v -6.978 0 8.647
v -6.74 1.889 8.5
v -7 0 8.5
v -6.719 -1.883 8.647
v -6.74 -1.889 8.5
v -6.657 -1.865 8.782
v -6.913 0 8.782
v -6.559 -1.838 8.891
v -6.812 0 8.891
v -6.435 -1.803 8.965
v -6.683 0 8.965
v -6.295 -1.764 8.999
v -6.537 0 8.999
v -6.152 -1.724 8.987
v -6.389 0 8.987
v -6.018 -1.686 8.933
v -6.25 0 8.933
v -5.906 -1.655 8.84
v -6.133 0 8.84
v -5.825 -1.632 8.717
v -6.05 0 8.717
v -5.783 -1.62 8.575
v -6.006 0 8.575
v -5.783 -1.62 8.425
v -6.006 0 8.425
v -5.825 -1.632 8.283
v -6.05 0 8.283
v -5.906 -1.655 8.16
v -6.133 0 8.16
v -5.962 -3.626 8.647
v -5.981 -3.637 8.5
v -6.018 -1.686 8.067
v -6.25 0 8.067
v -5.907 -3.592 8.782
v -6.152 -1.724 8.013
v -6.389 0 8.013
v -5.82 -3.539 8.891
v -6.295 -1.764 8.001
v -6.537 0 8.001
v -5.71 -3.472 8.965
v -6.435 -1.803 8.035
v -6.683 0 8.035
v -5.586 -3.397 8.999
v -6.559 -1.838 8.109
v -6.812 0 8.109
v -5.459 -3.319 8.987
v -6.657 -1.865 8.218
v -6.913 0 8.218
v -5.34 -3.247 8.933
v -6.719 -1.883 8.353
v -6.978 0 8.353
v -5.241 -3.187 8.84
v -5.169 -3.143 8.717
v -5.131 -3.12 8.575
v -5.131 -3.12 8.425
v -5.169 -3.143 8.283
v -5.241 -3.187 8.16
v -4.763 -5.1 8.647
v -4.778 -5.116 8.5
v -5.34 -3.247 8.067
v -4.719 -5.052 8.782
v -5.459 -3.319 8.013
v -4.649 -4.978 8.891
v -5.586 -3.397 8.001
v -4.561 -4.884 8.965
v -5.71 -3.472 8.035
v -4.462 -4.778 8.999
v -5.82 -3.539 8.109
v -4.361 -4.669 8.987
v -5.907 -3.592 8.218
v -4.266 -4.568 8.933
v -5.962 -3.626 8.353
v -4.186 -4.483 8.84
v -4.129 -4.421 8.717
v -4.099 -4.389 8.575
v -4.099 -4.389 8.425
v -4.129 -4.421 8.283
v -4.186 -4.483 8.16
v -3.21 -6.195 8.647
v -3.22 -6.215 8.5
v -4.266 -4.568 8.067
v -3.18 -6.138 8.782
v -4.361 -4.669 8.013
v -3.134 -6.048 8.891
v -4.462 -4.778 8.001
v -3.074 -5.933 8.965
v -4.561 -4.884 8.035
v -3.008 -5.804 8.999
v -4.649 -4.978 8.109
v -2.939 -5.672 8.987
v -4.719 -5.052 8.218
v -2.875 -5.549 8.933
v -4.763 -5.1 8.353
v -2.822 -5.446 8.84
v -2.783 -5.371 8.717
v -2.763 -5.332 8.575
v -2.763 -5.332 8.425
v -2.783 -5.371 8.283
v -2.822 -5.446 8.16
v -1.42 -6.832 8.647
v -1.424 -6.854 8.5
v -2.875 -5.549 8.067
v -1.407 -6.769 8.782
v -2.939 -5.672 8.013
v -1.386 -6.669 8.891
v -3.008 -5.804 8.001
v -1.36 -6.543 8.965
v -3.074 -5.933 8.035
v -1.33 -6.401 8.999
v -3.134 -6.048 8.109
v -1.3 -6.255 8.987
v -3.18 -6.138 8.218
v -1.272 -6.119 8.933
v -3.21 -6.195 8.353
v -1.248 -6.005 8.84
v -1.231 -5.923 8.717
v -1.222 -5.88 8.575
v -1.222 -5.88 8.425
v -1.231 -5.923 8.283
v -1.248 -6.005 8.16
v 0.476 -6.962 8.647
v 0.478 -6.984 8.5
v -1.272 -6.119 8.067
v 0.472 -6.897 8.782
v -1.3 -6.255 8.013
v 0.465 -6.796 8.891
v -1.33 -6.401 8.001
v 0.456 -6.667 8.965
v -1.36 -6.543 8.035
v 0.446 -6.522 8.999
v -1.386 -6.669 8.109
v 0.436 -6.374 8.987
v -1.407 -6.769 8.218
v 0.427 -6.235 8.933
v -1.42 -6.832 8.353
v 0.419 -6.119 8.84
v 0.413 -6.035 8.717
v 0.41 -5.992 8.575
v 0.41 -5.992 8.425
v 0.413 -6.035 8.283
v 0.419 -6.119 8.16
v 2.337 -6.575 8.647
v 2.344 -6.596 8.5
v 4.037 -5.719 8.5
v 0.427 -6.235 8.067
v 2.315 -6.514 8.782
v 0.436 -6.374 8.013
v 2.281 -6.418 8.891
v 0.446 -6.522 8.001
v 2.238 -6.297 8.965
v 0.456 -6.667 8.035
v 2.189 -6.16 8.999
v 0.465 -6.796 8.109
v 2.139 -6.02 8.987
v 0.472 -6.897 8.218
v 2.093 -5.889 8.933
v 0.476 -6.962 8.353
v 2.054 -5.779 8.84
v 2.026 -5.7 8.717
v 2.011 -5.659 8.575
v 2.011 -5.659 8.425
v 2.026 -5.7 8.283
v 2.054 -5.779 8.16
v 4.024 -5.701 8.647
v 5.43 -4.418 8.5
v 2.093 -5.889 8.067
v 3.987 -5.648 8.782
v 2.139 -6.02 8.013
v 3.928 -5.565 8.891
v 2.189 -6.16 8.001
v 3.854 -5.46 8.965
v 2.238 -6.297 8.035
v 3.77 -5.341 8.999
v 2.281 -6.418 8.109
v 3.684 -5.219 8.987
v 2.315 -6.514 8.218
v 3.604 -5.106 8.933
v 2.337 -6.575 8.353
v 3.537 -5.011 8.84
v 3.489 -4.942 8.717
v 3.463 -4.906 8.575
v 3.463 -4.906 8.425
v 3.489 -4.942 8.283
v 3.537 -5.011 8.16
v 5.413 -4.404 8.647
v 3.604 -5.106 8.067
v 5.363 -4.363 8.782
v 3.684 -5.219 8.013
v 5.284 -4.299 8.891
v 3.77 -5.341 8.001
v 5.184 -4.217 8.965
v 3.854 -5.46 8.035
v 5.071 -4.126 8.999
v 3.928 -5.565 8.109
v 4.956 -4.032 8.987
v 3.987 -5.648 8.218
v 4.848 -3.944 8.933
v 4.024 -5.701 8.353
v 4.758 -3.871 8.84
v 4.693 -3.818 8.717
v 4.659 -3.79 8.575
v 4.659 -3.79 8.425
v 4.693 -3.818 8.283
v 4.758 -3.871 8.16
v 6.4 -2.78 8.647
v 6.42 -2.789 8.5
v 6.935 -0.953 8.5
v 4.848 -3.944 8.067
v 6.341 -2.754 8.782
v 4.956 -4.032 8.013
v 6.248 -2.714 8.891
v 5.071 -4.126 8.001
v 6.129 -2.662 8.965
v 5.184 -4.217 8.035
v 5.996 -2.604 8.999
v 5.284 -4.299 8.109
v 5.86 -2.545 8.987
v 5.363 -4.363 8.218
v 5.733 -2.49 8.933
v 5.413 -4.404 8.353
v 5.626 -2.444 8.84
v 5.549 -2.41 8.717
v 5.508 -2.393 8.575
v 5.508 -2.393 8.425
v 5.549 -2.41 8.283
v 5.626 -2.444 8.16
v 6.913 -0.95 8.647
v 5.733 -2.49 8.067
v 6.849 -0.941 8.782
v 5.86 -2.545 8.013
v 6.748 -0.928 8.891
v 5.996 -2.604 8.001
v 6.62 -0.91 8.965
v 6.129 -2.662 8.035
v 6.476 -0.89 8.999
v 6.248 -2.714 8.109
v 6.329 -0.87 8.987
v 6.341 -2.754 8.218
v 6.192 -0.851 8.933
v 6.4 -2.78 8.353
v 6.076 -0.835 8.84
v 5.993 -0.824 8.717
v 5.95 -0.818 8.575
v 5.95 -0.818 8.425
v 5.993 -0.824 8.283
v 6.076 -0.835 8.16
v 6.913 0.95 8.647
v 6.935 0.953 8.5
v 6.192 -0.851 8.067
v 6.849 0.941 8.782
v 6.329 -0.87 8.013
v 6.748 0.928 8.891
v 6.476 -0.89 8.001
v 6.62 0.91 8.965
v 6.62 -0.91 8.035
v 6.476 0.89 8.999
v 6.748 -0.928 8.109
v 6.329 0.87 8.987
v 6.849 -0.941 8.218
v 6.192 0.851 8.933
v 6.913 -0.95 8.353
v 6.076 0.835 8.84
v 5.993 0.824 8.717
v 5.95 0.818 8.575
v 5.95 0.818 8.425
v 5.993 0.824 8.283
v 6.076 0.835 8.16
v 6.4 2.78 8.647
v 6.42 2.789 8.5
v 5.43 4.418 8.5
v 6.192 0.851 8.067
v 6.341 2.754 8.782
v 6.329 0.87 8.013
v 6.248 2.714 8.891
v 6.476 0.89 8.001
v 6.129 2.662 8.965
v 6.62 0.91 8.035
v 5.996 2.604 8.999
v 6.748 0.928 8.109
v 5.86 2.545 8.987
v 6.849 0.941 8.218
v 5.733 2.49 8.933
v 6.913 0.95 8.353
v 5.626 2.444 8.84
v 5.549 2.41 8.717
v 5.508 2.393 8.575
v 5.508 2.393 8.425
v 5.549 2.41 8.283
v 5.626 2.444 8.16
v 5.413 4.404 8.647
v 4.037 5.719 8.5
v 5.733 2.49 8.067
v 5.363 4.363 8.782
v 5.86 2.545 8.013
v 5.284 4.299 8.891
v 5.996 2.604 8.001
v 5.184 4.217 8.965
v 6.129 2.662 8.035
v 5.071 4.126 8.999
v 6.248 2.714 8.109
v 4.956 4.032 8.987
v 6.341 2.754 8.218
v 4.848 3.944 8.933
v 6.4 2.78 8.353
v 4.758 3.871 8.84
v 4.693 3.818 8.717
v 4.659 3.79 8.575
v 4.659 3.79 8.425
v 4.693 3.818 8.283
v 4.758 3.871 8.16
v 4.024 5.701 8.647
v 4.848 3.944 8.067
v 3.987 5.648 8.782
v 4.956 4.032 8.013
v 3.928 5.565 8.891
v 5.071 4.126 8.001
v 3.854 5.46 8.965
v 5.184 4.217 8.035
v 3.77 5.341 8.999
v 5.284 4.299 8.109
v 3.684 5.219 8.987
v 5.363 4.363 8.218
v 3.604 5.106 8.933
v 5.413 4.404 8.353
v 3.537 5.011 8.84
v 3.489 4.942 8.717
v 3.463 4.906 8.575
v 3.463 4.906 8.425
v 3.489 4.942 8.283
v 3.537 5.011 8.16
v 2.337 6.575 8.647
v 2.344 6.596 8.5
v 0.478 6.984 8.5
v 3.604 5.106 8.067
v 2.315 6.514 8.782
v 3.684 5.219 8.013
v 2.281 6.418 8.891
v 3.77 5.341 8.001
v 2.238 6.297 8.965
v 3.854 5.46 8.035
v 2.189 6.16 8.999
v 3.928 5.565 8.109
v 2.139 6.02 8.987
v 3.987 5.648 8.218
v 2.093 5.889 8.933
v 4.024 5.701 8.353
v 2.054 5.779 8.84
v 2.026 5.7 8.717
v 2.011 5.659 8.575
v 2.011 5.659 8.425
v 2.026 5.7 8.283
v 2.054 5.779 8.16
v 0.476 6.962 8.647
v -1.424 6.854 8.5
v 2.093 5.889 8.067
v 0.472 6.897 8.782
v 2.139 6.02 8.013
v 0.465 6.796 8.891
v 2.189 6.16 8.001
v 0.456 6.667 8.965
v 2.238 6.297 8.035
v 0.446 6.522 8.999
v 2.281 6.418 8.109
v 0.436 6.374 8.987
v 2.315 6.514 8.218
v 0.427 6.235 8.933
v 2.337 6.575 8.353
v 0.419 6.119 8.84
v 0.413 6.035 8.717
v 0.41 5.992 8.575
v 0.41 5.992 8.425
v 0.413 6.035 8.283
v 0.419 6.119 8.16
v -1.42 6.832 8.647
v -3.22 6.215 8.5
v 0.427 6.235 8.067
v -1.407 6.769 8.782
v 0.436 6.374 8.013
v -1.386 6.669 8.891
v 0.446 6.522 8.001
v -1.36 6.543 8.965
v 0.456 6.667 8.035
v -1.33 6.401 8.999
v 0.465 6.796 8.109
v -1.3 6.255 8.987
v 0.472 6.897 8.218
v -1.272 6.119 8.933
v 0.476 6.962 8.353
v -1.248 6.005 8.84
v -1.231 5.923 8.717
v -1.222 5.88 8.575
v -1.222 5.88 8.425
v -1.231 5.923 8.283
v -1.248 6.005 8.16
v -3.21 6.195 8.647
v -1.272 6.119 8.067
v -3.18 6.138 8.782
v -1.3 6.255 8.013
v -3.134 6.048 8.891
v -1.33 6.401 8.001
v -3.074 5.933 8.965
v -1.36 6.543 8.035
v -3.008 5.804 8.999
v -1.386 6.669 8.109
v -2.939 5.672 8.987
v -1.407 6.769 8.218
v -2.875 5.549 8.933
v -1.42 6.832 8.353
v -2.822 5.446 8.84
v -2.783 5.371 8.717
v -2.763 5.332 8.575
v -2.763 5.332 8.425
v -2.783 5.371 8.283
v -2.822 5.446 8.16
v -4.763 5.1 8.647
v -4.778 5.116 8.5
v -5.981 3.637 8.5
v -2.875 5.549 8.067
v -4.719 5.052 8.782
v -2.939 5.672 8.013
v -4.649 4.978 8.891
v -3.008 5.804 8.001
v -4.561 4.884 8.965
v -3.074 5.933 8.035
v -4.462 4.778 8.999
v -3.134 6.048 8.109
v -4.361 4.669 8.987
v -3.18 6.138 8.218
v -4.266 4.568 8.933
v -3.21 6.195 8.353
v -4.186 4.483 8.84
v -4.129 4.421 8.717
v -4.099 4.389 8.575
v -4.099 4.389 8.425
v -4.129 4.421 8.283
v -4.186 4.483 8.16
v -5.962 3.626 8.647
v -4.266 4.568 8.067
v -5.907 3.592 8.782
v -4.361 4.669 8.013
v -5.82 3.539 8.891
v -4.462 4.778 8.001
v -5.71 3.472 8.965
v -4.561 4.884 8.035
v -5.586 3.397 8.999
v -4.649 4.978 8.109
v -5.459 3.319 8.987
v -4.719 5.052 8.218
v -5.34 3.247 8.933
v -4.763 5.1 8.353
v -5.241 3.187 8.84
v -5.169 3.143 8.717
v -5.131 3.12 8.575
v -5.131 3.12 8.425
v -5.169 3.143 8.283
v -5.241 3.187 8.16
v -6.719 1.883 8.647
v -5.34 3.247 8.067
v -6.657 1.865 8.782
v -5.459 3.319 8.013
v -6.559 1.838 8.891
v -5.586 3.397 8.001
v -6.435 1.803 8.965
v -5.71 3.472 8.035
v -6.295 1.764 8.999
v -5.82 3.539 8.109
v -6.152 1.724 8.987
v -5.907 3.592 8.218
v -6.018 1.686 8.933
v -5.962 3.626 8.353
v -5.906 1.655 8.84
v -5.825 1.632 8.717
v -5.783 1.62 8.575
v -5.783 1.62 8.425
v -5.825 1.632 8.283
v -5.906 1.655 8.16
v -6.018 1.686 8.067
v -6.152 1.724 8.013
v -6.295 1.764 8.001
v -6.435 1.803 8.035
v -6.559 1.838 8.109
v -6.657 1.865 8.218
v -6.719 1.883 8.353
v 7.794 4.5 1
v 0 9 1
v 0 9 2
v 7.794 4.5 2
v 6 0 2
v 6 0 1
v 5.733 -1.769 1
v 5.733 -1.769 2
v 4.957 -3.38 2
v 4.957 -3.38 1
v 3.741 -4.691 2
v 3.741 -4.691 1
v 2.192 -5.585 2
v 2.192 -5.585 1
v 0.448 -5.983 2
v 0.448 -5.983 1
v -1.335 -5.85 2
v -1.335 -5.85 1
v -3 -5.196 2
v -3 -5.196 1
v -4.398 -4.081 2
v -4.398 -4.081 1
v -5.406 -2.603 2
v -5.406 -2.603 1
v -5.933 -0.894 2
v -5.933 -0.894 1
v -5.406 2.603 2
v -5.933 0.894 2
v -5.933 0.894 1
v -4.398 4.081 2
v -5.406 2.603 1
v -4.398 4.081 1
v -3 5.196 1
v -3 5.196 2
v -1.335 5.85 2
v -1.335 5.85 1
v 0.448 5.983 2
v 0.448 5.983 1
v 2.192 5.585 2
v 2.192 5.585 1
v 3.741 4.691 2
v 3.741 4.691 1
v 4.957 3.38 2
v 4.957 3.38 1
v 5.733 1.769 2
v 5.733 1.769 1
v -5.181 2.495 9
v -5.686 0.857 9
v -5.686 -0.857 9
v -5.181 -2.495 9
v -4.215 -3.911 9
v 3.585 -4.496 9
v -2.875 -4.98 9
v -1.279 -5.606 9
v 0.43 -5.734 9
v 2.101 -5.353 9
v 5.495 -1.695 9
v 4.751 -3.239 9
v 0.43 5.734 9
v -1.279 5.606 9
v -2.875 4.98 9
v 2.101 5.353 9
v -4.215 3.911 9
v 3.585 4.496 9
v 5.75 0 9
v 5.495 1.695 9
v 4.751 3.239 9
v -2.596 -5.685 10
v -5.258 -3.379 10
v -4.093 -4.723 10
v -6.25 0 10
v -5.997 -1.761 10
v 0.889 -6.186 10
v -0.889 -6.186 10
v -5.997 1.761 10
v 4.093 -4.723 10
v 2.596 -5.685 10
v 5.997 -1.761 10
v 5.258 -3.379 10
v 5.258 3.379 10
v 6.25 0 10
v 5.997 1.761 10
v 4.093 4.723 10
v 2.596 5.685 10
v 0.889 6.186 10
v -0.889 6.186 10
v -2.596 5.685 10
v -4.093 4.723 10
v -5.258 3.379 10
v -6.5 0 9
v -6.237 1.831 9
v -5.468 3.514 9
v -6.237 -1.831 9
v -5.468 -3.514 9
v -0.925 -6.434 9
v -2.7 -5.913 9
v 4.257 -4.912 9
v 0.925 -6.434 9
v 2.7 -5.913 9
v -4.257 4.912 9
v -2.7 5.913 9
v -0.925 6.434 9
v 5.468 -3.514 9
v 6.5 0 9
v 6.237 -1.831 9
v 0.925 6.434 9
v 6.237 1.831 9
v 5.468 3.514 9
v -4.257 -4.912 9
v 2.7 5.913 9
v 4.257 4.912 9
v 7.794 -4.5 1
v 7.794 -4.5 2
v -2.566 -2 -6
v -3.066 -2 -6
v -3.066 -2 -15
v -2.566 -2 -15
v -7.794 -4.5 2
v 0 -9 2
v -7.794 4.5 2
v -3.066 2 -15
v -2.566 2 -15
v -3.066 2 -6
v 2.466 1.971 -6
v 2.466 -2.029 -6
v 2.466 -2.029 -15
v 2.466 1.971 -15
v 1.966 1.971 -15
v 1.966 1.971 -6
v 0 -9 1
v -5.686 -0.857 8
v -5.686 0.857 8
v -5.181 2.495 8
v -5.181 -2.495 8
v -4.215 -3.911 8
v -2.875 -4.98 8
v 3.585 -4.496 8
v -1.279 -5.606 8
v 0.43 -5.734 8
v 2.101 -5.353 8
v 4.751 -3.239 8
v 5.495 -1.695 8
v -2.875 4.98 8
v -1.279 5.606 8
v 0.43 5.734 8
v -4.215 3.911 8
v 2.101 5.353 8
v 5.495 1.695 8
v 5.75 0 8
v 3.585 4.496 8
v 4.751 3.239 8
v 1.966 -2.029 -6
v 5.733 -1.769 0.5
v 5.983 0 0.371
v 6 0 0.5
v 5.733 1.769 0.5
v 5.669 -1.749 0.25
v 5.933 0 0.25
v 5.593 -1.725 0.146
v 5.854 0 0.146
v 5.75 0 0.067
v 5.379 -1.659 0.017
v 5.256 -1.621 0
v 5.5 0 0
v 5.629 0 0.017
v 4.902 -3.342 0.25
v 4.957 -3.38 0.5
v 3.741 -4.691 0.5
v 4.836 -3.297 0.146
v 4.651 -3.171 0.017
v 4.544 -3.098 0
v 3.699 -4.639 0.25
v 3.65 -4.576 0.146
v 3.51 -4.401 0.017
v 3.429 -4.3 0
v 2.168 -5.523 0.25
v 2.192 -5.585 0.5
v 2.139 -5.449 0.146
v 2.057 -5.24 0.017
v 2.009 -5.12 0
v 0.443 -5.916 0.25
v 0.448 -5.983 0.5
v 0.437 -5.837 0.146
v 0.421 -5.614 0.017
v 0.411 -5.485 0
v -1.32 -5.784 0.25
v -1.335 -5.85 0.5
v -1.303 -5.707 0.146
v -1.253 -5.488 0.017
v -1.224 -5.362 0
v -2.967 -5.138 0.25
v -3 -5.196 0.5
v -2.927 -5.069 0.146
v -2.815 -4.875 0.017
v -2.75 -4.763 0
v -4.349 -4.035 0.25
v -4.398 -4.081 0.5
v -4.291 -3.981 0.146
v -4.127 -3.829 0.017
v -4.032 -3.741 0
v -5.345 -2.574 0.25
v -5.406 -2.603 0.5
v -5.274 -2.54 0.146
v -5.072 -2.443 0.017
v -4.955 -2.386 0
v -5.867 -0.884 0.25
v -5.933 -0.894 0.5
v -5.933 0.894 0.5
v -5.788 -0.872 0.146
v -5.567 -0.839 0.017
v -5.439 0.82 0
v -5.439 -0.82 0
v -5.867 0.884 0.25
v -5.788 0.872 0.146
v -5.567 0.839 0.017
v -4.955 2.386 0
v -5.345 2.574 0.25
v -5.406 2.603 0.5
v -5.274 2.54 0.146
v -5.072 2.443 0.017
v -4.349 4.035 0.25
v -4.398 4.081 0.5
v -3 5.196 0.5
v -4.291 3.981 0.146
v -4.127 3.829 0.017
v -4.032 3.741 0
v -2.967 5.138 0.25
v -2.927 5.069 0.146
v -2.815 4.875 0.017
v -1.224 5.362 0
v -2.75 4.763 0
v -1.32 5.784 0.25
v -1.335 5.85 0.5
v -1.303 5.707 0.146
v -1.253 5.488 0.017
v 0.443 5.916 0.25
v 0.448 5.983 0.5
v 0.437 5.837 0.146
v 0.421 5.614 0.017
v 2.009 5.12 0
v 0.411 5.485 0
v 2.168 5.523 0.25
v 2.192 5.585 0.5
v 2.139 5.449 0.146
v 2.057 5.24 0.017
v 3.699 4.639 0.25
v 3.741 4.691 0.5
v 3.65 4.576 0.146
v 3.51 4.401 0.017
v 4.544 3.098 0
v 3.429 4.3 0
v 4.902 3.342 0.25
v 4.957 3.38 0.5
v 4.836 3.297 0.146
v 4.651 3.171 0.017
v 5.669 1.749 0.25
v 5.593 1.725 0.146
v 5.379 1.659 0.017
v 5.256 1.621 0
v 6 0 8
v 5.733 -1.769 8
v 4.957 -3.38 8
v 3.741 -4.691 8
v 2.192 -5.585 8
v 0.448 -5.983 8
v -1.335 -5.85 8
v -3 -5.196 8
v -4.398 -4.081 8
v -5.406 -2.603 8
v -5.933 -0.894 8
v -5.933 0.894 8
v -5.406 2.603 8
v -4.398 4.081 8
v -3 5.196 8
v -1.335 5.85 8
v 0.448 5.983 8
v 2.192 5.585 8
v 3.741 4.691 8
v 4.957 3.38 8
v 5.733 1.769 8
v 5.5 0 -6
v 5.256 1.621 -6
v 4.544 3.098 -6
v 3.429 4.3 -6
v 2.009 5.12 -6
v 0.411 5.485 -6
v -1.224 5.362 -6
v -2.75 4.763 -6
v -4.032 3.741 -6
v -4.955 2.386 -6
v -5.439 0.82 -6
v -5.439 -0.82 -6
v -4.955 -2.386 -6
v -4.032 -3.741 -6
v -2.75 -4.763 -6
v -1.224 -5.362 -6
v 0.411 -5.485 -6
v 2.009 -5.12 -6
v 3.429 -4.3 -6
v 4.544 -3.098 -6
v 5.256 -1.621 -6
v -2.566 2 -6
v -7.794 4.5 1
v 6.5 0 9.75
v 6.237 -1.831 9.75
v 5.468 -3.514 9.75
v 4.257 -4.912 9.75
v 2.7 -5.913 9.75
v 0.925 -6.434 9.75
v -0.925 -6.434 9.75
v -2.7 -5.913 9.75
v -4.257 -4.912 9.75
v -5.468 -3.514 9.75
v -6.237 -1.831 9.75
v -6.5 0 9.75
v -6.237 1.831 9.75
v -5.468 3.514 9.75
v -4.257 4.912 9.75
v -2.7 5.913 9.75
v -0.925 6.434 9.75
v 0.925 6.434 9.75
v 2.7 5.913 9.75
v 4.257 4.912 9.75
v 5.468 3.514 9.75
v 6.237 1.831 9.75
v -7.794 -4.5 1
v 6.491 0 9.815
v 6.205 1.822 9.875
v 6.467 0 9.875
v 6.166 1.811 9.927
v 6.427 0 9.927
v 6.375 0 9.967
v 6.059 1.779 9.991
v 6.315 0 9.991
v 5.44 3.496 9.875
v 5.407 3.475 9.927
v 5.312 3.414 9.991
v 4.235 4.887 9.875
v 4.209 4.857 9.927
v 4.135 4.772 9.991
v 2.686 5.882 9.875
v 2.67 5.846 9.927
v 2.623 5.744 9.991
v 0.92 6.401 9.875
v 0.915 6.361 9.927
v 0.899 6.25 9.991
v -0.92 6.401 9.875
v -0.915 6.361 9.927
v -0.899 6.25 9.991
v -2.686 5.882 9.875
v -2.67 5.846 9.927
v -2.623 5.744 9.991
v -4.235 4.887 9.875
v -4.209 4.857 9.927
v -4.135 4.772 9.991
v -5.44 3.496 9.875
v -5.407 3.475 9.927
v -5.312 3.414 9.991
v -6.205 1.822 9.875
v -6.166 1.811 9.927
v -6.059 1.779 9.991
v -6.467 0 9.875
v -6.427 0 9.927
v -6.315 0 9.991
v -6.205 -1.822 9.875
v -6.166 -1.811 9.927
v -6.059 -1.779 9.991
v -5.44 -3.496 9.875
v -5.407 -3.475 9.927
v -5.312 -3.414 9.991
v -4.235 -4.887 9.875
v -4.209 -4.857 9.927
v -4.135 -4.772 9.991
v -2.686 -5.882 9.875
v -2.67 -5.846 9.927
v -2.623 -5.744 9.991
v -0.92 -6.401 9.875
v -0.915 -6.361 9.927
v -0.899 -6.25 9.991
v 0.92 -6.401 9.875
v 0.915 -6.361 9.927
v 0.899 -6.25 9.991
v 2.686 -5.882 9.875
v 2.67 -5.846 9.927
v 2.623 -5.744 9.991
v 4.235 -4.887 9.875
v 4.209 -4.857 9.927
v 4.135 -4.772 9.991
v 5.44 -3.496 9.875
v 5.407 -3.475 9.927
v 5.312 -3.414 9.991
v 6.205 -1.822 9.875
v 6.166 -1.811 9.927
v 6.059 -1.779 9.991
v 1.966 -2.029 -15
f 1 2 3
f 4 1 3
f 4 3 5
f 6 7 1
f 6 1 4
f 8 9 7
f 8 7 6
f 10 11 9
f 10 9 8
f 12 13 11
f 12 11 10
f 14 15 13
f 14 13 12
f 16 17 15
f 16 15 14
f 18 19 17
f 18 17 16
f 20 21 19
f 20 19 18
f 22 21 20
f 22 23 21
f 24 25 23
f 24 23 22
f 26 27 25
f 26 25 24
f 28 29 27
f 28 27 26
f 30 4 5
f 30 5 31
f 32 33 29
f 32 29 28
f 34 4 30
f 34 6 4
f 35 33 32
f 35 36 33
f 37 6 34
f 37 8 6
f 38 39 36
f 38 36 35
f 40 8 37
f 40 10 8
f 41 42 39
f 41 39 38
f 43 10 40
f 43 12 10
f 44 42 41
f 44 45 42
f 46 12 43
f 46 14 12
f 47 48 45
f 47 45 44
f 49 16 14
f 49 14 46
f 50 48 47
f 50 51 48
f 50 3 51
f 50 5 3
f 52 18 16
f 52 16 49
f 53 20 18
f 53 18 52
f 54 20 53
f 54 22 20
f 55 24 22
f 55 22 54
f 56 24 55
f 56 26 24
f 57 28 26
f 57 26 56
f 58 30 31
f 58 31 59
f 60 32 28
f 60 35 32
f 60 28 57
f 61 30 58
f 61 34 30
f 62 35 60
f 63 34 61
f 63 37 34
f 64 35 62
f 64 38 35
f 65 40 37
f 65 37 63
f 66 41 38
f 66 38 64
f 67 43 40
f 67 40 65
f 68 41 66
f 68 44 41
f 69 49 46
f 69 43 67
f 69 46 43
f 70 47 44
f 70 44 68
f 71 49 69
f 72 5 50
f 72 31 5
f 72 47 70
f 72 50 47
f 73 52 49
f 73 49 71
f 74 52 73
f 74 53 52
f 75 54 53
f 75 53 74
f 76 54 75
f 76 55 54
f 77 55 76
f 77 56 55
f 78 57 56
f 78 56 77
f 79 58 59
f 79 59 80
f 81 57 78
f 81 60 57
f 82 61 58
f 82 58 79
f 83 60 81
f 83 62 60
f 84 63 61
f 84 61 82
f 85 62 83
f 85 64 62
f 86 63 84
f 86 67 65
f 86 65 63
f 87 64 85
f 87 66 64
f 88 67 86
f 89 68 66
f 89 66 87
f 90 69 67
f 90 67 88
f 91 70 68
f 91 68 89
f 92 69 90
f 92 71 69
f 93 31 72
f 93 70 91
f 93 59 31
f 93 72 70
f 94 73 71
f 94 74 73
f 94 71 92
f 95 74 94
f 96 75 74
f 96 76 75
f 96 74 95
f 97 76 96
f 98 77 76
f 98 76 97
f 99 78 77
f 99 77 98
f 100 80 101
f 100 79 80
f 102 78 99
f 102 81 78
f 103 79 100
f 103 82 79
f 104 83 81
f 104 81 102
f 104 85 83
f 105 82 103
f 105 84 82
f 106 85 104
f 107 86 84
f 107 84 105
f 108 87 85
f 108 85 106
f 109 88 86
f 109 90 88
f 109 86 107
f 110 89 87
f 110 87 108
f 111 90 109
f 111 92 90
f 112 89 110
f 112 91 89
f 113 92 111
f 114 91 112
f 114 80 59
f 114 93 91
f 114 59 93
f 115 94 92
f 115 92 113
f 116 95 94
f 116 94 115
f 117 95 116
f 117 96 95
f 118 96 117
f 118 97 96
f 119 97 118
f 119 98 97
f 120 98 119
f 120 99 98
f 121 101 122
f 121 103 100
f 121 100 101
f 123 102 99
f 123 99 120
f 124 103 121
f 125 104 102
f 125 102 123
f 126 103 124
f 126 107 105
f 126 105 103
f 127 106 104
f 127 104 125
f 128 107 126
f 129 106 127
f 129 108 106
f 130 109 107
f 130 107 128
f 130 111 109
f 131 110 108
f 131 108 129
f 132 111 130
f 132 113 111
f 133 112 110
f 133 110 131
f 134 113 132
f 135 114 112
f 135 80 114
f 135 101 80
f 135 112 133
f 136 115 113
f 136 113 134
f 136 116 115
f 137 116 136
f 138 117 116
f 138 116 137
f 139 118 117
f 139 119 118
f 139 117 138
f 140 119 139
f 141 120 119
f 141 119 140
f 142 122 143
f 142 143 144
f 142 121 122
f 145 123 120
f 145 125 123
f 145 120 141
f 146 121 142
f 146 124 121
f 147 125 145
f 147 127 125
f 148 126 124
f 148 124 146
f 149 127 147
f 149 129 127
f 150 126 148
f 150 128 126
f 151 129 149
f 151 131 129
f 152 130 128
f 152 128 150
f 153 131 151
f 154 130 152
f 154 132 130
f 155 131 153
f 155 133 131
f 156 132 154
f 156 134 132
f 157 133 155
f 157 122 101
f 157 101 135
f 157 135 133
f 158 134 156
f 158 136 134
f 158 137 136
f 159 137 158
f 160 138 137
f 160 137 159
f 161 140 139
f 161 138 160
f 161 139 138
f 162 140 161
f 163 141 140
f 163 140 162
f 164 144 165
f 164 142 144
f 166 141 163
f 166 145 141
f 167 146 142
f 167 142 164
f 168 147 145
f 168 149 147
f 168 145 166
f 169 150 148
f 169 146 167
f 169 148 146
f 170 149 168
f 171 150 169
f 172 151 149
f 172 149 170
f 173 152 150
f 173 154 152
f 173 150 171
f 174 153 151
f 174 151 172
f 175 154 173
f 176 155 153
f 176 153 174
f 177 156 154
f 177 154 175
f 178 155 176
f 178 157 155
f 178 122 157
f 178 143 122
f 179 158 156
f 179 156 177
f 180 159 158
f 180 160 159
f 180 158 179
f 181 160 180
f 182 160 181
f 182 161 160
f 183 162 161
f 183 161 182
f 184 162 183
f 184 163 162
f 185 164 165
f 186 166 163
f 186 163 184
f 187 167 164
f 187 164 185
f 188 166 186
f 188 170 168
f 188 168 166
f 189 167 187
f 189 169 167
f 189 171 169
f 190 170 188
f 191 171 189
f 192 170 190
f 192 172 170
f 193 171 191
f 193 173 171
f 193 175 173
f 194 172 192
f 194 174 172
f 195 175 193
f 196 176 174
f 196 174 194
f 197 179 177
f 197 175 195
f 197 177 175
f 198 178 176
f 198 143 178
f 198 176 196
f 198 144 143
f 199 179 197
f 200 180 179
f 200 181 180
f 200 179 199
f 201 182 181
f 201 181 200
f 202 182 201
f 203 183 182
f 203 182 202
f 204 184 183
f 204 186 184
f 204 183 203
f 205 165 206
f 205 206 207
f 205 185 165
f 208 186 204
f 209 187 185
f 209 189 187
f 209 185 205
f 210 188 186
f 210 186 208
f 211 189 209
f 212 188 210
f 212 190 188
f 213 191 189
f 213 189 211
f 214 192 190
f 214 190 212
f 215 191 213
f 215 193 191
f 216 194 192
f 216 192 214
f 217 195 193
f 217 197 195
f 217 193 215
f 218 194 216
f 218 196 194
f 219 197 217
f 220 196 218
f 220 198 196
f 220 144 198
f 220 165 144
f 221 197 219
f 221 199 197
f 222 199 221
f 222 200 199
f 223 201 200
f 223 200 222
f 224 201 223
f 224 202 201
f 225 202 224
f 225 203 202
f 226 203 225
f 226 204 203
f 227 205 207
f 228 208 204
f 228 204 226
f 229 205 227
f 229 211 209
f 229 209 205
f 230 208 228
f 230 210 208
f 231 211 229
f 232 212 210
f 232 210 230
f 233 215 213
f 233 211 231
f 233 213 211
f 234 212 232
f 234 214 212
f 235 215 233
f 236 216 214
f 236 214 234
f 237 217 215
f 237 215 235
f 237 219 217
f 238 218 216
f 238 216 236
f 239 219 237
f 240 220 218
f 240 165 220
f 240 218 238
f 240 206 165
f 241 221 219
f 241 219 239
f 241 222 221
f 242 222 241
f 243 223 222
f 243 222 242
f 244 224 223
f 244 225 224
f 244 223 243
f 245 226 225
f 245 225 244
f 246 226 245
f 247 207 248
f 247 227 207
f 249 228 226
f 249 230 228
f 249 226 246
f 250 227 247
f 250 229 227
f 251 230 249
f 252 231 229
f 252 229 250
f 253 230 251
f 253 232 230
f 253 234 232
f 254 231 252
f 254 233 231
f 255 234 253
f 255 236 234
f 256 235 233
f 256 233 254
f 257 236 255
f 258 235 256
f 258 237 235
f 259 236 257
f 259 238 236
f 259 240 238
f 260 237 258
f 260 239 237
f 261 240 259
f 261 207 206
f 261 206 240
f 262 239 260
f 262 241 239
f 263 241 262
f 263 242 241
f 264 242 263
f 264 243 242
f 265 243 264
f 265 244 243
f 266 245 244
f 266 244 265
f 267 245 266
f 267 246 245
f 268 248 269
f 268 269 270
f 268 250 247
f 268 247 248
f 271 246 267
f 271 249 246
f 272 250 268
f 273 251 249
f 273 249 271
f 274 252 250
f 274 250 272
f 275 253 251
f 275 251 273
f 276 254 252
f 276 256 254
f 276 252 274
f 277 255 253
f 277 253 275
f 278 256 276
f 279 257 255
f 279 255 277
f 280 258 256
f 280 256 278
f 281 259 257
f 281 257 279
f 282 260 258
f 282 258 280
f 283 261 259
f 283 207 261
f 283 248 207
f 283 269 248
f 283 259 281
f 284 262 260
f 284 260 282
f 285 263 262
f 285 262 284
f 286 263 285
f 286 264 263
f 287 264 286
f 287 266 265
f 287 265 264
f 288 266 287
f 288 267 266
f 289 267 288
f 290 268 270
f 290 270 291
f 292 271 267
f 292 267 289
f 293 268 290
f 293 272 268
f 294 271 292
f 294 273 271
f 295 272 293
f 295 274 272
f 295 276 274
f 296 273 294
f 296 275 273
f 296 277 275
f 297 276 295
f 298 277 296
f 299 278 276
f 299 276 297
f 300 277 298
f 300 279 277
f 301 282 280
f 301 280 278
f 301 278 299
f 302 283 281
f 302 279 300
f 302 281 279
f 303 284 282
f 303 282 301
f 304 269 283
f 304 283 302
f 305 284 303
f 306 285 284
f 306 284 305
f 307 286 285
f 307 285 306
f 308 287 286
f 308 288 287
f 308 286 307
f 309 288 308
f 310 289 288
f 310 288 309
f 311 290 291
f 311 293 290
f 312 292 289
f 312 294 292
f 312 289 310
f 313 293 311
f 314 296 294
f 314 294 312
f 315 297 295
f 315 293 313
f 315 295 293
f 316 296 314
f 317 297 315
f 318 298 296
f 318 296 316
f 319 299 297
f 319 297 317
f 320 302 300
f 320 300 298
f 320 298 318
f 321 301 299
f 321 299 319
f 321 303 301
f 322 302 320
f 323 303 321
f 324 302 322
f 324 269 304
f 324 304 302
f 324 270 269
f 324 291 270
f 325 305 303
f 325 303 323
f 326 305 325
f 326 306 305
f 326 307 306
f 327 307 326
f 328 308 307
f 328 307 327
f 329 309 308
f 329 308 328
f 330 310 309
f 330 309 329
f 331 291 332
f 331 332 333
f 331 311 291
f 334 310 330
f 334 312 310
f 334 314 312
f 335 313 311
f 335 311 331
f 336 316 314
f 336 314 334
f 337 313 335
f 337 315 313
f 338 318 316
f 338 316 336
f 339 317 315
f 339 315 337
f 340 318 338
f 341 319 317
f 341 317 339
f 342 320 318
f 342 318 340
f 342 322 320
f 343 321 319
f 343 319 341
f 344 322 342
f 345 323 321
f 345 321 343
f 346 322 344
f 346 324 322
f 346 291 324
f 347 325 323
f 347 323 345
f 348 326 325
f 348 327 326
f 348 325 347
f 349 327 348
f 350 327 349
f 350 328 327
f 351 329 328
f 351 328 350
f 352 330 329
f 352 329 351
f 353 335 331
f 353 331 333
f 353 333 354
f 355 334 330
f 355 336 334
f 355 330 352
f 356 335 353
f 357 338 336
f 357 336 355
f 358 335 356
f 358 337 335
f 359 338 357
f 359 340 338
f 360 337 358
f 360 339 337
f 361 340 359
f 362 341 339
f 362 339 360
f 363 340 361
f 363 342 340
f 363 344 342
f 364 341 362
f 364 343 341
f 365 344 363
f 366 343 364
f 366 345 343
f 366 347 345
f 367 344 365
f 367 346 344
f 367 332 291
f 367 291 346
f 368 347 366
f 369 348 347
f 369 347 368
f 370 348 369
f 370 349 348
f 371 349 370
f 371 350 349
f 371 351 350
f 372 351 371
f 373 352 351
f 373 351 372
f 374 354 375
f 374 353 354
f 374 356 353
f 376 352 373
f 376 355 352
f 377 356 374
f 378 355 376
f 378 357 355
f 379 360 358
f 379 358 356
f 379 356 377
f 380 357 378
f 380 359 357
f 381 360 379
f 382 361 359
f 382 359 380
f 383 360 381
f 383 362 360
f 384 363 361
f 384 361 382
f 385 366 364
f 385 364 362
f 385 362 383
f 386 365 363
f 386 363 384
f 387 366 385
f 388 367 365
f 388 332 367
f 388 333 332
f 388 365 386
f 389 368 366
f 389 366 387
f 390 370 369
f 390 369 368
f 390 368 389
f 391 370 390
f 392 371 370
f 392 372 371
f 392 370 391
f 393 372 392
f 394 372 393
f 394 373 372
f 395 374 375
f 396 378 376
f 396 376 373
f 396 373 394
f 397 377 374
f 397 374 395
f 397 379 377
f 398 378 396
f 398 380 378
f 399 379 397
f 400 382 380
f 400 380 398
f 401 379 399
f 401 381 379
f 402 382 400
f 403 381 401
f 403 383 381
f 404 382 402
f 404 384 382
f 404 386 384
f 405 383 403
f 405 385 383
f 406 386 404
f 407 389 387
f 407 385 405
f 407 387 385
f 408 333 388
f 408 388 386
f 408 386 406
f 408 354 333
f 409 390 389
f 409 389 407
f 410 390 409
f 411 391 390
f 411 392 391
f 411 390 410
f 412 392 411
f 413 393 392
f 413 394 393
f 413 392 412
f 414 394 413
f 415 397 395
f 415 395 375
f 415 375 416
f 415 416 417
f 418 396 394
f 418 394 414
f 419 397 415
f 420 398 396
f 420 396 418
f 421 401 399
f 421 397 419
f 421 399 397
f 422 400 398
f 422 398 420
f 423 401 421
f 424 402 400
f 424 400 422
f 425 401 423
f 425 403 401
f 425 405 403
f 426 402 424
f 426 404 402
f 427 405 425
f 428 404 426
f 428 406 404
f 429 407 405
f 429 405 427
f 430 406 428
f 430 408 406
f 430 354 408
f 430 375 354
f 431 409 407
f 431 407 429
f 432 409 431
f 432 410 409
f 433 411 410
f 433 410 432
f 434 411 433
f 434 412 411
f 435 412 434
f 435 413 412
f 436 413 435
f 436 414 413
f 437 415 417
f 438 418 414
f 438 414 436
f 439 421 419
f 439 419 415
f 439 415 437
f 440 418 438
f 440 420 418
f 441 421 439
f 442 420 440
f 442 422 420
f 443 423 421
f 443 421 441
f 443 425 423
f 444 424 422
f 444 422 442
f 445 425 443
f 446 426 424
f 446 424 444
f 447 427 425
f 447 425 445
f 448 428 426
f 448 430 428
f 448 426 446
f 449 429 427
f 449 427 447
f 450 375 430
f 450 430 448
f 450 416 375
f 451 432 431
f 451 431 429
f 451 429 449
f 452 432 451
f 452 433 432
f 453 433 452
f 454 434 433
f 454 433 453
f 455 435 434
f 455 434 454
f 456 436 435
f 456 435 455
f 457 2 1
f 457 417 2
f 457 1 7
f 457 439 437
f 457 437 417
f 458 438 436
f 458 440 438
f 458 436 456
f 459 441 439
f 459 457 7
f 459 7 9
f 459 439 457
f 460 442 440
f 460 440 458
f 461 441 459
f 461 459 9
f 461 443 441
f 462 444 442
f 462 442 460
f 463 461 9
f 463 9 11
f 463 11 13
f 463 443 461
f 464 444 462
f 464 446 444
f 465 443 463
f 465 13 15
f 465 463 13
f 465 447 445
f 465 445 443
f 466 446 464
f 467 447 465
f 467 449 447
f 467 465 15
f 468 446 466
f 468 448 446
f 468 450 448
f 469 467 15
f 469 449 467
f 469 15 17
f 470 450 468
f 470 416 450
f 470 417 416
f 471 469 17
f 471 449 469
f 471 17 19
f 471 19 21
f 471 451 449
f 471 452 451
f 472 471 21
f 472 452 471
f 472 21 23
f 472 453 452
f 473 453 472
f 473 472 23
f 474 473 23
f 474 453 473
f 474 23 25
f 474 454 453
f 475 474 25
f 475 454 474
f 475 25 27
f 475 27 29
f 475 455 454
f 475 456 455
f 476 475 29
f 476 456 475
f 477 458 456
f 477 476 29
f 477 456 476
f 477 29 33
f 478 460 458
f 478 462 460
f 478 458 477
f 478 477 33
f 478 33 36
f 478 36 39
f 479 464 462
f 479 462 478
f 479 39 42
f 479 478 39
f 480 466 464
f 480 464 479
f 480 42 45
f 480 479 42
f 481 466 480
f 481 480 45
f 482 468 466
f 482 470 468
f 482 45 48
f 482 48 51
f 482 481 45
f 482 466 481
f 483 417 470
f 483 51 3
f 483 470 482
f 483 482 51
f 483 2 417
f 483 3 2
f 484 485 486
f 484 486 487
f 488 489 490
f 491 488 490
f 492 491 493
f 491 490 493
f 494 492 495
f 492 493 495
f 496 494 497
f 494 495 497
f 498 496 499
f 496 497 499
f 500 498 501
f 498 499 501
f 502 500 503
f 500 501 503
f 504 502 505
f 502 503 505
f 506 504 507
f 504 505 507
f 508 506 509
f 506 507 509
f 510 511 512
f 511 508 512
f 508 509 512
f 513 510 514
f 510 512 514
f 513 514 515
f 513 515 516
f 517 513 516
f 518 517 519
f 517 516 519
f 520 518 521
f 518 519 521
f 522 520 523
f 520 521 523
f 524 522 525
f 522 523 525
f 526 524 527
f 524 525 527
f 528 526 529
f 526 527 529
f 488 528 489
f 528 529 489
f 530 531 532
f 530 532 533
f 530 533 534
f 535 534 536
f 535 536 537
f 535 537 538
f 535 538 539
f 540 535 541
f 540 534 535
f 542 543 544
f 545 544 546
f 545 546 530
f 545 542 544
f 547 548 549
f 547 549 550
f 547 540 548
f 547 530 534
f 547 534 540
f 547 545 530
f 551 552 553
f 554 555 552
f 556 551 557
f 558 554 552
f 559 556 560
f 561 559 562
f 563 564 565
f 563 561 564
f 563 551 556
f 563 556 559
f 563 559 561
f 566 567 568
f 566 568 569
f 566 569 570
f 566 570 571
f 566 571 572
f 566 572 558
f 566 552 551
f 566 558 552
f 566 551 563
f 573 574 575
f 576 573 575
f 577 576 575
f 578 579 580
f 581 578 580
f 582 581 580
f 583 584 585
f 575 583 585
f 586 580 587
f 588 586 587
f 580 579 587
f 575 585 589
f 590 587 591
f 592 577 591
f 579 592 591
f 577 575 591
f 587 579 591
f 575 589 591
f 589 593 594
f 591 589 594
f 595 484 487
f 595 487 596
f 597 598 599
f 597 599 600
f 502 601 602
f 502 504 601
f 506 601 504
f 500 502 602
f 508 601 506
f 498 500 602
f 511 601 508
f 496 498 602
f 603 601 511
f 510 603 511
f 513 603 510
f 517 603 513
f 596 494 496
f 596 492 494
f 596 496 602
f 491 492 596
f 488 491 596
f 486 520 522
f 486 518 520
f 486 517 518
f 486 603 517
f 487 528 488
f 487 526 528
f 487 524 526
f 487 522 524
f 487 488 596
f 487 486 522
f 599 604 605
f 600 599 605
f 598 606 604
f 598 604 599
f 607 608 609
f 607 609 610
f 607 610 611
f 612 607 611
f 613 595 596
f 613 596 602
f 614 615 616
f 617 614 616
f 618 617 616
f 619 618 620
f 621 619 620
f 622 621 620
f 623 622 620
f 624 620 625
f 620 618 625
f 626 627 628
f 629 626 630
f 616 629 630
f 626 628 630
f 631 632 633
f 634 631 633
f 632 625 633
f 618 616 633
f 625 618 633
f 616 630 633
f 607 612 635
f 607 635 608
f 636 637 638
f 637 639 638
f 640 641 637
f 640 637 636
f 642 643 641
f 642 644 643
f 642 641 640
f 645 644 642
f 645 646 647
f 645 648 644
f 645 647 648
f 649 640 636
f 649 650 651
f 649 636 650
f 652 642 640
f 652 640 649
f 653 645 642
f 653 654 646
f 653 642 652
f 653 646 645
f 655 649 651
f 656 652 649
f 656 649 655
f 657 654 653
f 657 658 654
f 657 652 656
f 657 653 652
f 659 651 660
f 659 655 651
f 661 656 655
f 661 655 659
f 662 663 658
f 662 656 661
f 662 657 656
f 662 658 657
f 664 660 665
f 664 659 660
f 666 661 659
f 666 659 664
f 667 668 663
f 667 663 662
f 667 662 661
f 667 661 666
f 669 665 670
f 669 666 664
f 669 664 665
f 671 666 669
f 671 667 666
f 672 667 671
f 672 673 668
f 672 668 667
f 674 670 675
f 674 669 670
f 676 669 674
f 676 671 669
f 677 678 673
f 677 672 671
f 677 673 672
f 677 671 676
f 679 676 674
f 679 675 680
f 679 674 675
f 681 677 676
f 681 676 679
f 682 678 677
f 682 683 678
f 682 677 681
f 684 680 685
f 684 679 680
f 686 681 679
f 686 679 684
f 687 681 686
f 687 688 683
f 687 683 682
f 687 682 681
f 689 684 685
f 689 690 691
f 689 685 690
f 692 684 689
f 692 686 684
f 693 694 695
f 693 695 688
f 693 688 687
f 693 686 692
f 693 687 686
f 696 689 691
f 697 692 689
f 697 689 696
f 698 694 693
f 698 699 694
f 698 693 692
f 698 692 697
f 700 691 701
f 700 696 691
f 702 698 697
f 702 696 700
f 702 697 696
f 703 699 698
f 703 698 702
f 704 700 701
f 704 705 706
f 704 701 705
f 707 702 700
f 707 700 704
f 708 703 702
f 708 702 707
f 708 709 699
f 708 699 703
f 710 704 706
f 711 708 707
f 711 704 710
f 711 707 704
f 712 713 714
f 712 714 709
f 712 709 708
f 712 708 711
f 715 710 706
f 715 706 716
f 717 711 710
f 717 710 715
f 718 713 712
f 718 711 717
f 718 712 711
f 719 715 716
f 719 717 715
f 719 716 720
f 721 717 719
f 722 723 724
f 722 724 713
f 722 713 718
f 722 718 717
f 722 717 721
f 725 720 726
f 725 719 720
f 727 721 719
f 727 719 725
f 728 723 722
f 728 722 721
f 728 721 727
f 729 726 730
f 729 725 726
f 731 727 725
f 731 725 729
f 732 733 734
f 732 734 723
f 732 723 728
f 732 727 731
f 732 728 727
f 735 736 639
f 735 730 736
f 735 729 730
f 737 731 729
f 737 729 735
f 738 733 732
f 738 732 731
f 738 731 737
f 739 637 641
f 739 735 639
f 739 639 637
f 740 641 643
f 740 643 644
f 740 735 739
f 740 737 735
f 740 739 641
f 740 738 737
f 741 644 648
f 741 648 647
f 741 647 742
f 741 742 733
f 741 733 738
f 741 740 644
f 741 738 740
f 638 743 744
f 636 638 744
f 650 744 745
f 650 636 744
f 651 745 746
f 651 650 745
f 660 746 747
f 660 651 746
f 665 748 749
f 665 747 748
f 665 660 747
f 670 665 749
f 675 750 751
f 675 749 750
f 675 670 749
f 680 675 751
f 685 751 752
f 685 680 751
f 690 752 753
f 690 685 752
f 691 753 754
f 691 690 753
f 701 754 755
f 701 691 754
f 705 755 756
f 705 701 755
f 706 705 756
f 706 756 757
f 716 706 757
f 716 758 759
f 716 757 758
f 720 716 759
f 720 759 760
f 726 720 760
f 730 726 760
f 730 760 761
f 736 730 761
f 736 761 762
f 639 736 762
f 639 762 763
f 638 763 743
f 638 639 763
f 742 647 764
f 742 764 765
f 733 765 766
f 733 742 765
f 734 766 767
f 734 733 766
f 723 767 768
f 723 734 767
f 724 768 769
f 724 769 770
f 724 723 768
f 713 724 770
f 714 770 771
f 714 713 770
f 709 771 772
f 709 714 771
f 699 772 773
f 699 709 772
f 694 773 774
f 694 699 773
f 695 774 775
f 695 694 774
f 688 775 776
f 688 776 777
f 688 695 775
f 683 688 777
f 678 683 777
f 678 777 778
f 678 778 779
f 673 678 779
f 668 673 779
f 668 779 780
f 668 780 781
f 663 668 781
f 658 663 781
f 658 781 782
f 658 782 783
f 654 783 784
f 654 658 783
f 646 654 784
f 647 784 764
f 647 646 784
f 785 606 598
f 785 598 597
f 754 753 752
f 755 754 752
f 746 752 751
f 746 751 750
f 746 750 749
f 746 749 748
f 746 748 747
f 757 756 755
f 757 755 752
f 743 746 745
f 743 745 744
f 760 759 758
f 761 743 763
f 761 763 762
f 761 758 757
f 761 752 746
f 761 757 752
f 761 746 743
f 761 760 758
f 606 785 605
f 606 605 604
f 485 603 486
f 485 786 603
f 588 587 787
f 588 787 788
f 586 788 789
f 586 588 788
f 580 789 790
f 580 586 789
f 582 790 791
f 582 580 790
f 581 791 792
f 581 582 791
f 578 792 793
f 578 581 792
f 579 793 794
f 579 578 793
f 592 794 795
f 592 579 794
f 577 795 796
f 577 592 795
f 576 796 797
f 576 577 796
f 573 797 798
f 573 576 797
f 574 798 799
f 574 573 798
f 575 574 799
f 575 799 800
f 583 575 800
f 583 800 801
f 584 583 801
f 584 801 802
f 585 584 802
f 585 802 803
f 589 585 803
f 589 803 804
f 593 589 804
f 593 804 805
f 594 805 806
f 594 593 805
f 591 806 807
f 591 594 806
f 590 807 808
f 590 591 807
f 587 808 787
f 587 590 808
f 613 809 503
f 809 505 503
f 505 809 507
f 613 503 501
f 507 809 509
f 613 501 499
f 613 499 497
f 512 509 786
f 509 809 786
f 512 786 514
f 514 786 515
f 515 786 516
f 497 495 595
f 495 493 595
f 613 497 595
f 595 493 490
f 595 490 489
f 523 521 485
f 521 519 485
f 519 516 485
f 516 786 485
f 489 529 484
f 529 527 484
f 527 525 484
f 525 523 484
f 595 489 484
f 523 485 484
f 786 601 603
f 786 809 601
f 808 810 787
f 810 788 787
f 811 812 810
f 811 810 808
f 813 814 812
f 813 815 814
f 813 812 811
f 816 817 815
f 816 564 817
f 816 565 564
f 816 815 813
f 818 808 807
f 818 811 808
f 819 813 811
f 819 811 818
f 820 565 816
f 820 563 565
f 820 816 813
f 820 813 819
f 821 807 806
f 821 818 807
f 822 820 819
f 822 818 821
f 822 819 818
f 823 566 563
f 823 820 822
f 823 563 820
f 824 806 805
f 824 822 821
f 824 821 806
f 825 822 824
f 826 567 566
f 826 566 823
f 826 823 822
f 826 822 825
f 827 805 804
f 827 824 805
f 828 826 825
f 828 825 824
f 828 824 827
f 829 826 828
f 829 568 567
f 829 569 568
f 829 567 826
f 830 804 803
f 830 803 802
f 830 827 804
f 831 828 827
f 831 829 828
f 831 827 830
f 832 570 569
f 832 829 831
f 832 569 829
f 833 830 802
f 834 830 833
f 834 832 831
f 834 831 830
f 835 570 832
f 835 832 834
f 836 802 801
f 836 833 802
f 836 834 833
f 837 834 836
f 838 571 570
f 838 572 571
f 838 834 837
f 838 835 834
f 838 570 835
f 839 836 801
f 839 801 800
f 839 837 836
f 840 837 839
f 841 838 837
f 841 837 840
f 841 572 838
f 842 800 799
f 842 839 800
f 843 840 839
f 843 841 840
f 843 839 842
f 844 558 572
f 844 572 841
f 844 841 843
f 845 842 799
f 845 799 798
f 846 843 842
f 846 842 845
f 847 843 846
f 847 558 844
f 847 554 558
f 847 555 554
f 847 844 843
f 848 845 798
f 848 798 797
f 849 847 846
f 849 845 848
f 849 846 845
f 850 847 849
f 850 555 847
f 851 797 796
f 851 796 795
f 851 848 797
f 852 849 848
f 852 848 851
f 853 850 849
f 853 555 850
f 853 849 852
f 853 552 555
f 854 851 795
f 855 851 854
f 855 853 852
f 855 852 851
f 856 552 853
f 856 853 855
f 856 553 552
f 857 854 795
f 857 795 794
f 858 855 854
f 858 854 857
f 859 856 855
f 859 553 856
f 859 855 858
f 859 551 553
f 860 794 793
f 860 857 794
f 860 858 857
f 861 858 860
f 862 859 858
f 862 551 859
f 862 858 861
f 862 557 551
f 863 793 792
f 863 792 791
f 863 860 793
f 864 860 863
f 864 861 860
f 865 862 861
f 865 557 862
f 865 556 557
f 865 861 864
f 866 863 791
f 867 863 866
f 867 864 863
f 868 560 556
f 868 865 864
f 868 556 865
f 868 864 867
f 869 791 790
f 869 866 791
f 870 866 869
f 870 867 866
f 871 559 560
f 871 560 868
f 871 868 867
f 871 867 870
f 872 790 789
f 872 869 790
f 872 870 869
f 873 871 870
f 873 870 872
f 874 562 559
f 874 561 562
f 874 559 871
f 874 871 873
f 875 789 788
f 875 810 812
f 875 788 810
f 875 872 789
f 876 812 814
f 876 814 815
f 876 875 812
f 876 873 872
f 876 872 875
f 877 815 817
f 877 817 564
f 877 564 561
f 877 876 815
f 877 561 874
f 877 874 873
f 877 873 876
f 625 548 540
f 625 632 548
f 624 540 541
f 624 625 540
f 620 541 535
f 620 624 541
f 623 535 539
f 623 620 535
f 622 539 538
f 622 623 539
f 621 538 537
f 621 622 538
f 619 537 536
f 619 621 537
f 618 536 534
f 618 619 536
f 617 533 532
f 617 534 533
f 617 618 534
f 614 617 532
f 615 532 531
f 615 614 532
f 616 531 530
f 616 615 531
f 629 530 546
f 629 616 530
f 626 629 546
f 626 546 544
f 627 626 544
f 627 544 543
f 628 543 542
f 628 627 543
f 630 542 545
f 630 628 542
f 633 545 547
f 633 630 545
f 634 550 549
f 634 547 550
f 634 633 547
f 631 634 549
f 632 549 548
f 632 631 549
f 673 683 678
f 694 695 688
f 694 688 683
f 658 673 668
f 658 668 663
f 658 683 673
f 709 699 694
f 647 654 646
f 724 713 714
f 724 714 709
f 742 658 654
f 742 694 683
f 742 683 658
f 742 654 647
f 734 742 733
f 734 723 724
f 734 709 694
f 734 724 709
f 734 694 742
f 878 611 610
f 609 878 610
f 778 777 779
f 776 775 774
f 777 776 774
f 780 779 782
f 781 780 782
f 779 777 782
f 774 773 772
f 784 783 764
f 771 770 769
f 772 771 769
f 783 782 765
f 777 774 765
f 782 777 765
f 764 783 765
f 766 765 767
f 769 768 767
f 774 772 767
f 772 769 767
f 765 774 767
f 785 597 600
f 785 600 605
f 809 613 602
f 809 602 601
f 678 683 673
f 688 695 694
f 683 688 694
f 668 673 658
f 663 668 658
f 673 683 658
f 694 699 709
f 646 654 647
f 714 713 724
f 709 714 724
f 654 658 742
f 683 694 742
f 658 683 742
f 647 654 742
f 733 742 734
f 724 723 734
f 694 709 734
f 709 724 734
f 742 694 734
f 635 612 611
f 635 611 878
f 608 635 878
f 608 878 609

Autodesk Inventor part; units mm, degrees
ref_plane "YZ Plane" through (0, 0, 0) normal (1, 0, 0) x (0, 1, 0)
ref_plane "XZ Plane" through (0, 0, 0) normal (0, 1, 0) x (-1, 0, 0)
ref_plane "XY Plane" through (0, 0, 0) normal (0, 0, 1) x (1, 0, 0)
sketch "Skizze1" plane through (0, 0, 0) normal (0, 0, 1) x (1, 0, 0)
  circle A0 centre (0, 0) radius 5.5
  dimension "d0" = 11
extrude "Extrusion1" add sketch "Skizze1" against normal blind 6
sketch "Skizze2" plane through (0, 0, 0) normal (0, 0, 1) x (1, 0, 0)
  circle A0 centre (0, 0) radius 6
  dimension "d5" = 12
extrude "Extrusion2" add sketch "Skizze2" along normal blind 8 separate body
thread "Gewinde1" size "M12x1.75" class "6g" standard "ANSI Metric M Profile" full length
sketch "Skizze3" plane through (0, 0, 0) normal (0, 0, 1) x (1, 0, 0)
  circle A0 centre (0, 0) radius 5.75
  dimension "d10" = 11.5
extrude "Extrusion3" add sketch "Skizze3" along normal blind 1 separate body
move or copy body "Körper verschieben1" bodies to move or copy 3 copy no translate (0, 0, 8)
fillet "Rundung1" radius 0.5 1 edges at (-6, 0, 0)
sketch "Skizze4" plane through (0, 0, 0) normal (0, 0, 1) x (1, 0, 0)
  circle A0 centre (0, 0) radius 6.5
  dimension "d19" = 13
extrude "Extrusion4" add sketch "Skizze4" along normal blind 1 separate body
move or copy body "Körper verschieben2" bodies to move or copy 4 copy no translate (0, 0, 9)
fillet "Rundung2" radius 0.25 1 edges at (-6.5, 0, 10)
sketch "Skizze5" plane through (0, 0, 0) normal (0, 1, 0) x (-1, 0, 0)
  circle A0 centre (6.5, 0) radius 0.5
  line L0 (0, -3.25) -> (0, 3.25)
  line L1 (0, 0) -> (6.5, 0) construction
  dimension "d26" = 1
  dimension "d27" = 6.5
revolve "Umdrehung1" add sketch "Skizze5" angle 360 about axis through (0, 0, -3.25) along (0, 0, 1) separate body
move or copy body "Körper verschieben3" bodies to move or copy 5 copy no translate (0, 0, 8.5)
sketch "Skizze6" plane through (0, 0, 0) normal (0, 0, 1) x (1, 0, 0)
  line L0 (0, 9) -> (7.7942, 4.5)
  line L1 (7.7942, 4.5) -> (7.7942, -4.5)
  line L2 (7.7942, -4.5) -> (0, -9)
  line L3 (0, -9) -> (-7.7942, -4.5)
  line L4 (-7.7942, -4.5) -> (-7.7942, 4.5)
  line L5 (-7.7942, 4.5) -> (0, 9)
  circle A0 centre (0, 0) radius 6
  dimension "d32" = 12
extrude "Extrusion5" add sketch "Skizze6" along normal blind 1 separate body
move or copy body "Körper verschieben4" bodies to move or copy 6 copy no translate (0, 0, 1)
sketch "Skizze7" plane through (0, 0, 0) normal (0, 0, 1) x (1, 0, 0)
  line L0 (-3.066, -2) -> (-2.566, -2)
  line L1 (-2.566, -2) -> (-2.566, 2)
  line L2 (-2.566, 2) -> (-3.066, 2)
  line L3 (-3.066, 2) -> (-3.066, -2)
  line L4 (-3.066, -2) -> (-2.566, 2) construction
  line L5 (-2.566, -2) -> (-3.066, 2) construction
  line L6 (1.9662, -2.029) -> (2.4662, -2.029)
  line L7 (2.4662, -2.029) -> (2.4662, 1.971)
  line L8 (2.4662, 1.971) -> (1.9662, 1.971)
  line L9 (1.9662, 1.971) -> (1.9662, -2.029)
  line L10 (1.9662, -2.029) -> (2.4662, 1.971) construction
  line L11 (2.4662, -2.029) -> (1.9662, 1.971) construction
  point P0 (0, 0)
  point P1 (-2.816, 0)
  point P2 (2.2162, -0.029)
  dimension "d38" = 0.5
  dimension "d39" = 4
  dimension "d40" = 0.5
  dimension "d41" = 4
extrude "Extrusion6" add sketch "Skizze7" against normal blind 9 separate body
move or copy body "Körper verschieben5" bodies to move or copy 7 copy no translate (0, 0, -6)
properties part number "Hohlstecker" material "Stahl, verchromt"
